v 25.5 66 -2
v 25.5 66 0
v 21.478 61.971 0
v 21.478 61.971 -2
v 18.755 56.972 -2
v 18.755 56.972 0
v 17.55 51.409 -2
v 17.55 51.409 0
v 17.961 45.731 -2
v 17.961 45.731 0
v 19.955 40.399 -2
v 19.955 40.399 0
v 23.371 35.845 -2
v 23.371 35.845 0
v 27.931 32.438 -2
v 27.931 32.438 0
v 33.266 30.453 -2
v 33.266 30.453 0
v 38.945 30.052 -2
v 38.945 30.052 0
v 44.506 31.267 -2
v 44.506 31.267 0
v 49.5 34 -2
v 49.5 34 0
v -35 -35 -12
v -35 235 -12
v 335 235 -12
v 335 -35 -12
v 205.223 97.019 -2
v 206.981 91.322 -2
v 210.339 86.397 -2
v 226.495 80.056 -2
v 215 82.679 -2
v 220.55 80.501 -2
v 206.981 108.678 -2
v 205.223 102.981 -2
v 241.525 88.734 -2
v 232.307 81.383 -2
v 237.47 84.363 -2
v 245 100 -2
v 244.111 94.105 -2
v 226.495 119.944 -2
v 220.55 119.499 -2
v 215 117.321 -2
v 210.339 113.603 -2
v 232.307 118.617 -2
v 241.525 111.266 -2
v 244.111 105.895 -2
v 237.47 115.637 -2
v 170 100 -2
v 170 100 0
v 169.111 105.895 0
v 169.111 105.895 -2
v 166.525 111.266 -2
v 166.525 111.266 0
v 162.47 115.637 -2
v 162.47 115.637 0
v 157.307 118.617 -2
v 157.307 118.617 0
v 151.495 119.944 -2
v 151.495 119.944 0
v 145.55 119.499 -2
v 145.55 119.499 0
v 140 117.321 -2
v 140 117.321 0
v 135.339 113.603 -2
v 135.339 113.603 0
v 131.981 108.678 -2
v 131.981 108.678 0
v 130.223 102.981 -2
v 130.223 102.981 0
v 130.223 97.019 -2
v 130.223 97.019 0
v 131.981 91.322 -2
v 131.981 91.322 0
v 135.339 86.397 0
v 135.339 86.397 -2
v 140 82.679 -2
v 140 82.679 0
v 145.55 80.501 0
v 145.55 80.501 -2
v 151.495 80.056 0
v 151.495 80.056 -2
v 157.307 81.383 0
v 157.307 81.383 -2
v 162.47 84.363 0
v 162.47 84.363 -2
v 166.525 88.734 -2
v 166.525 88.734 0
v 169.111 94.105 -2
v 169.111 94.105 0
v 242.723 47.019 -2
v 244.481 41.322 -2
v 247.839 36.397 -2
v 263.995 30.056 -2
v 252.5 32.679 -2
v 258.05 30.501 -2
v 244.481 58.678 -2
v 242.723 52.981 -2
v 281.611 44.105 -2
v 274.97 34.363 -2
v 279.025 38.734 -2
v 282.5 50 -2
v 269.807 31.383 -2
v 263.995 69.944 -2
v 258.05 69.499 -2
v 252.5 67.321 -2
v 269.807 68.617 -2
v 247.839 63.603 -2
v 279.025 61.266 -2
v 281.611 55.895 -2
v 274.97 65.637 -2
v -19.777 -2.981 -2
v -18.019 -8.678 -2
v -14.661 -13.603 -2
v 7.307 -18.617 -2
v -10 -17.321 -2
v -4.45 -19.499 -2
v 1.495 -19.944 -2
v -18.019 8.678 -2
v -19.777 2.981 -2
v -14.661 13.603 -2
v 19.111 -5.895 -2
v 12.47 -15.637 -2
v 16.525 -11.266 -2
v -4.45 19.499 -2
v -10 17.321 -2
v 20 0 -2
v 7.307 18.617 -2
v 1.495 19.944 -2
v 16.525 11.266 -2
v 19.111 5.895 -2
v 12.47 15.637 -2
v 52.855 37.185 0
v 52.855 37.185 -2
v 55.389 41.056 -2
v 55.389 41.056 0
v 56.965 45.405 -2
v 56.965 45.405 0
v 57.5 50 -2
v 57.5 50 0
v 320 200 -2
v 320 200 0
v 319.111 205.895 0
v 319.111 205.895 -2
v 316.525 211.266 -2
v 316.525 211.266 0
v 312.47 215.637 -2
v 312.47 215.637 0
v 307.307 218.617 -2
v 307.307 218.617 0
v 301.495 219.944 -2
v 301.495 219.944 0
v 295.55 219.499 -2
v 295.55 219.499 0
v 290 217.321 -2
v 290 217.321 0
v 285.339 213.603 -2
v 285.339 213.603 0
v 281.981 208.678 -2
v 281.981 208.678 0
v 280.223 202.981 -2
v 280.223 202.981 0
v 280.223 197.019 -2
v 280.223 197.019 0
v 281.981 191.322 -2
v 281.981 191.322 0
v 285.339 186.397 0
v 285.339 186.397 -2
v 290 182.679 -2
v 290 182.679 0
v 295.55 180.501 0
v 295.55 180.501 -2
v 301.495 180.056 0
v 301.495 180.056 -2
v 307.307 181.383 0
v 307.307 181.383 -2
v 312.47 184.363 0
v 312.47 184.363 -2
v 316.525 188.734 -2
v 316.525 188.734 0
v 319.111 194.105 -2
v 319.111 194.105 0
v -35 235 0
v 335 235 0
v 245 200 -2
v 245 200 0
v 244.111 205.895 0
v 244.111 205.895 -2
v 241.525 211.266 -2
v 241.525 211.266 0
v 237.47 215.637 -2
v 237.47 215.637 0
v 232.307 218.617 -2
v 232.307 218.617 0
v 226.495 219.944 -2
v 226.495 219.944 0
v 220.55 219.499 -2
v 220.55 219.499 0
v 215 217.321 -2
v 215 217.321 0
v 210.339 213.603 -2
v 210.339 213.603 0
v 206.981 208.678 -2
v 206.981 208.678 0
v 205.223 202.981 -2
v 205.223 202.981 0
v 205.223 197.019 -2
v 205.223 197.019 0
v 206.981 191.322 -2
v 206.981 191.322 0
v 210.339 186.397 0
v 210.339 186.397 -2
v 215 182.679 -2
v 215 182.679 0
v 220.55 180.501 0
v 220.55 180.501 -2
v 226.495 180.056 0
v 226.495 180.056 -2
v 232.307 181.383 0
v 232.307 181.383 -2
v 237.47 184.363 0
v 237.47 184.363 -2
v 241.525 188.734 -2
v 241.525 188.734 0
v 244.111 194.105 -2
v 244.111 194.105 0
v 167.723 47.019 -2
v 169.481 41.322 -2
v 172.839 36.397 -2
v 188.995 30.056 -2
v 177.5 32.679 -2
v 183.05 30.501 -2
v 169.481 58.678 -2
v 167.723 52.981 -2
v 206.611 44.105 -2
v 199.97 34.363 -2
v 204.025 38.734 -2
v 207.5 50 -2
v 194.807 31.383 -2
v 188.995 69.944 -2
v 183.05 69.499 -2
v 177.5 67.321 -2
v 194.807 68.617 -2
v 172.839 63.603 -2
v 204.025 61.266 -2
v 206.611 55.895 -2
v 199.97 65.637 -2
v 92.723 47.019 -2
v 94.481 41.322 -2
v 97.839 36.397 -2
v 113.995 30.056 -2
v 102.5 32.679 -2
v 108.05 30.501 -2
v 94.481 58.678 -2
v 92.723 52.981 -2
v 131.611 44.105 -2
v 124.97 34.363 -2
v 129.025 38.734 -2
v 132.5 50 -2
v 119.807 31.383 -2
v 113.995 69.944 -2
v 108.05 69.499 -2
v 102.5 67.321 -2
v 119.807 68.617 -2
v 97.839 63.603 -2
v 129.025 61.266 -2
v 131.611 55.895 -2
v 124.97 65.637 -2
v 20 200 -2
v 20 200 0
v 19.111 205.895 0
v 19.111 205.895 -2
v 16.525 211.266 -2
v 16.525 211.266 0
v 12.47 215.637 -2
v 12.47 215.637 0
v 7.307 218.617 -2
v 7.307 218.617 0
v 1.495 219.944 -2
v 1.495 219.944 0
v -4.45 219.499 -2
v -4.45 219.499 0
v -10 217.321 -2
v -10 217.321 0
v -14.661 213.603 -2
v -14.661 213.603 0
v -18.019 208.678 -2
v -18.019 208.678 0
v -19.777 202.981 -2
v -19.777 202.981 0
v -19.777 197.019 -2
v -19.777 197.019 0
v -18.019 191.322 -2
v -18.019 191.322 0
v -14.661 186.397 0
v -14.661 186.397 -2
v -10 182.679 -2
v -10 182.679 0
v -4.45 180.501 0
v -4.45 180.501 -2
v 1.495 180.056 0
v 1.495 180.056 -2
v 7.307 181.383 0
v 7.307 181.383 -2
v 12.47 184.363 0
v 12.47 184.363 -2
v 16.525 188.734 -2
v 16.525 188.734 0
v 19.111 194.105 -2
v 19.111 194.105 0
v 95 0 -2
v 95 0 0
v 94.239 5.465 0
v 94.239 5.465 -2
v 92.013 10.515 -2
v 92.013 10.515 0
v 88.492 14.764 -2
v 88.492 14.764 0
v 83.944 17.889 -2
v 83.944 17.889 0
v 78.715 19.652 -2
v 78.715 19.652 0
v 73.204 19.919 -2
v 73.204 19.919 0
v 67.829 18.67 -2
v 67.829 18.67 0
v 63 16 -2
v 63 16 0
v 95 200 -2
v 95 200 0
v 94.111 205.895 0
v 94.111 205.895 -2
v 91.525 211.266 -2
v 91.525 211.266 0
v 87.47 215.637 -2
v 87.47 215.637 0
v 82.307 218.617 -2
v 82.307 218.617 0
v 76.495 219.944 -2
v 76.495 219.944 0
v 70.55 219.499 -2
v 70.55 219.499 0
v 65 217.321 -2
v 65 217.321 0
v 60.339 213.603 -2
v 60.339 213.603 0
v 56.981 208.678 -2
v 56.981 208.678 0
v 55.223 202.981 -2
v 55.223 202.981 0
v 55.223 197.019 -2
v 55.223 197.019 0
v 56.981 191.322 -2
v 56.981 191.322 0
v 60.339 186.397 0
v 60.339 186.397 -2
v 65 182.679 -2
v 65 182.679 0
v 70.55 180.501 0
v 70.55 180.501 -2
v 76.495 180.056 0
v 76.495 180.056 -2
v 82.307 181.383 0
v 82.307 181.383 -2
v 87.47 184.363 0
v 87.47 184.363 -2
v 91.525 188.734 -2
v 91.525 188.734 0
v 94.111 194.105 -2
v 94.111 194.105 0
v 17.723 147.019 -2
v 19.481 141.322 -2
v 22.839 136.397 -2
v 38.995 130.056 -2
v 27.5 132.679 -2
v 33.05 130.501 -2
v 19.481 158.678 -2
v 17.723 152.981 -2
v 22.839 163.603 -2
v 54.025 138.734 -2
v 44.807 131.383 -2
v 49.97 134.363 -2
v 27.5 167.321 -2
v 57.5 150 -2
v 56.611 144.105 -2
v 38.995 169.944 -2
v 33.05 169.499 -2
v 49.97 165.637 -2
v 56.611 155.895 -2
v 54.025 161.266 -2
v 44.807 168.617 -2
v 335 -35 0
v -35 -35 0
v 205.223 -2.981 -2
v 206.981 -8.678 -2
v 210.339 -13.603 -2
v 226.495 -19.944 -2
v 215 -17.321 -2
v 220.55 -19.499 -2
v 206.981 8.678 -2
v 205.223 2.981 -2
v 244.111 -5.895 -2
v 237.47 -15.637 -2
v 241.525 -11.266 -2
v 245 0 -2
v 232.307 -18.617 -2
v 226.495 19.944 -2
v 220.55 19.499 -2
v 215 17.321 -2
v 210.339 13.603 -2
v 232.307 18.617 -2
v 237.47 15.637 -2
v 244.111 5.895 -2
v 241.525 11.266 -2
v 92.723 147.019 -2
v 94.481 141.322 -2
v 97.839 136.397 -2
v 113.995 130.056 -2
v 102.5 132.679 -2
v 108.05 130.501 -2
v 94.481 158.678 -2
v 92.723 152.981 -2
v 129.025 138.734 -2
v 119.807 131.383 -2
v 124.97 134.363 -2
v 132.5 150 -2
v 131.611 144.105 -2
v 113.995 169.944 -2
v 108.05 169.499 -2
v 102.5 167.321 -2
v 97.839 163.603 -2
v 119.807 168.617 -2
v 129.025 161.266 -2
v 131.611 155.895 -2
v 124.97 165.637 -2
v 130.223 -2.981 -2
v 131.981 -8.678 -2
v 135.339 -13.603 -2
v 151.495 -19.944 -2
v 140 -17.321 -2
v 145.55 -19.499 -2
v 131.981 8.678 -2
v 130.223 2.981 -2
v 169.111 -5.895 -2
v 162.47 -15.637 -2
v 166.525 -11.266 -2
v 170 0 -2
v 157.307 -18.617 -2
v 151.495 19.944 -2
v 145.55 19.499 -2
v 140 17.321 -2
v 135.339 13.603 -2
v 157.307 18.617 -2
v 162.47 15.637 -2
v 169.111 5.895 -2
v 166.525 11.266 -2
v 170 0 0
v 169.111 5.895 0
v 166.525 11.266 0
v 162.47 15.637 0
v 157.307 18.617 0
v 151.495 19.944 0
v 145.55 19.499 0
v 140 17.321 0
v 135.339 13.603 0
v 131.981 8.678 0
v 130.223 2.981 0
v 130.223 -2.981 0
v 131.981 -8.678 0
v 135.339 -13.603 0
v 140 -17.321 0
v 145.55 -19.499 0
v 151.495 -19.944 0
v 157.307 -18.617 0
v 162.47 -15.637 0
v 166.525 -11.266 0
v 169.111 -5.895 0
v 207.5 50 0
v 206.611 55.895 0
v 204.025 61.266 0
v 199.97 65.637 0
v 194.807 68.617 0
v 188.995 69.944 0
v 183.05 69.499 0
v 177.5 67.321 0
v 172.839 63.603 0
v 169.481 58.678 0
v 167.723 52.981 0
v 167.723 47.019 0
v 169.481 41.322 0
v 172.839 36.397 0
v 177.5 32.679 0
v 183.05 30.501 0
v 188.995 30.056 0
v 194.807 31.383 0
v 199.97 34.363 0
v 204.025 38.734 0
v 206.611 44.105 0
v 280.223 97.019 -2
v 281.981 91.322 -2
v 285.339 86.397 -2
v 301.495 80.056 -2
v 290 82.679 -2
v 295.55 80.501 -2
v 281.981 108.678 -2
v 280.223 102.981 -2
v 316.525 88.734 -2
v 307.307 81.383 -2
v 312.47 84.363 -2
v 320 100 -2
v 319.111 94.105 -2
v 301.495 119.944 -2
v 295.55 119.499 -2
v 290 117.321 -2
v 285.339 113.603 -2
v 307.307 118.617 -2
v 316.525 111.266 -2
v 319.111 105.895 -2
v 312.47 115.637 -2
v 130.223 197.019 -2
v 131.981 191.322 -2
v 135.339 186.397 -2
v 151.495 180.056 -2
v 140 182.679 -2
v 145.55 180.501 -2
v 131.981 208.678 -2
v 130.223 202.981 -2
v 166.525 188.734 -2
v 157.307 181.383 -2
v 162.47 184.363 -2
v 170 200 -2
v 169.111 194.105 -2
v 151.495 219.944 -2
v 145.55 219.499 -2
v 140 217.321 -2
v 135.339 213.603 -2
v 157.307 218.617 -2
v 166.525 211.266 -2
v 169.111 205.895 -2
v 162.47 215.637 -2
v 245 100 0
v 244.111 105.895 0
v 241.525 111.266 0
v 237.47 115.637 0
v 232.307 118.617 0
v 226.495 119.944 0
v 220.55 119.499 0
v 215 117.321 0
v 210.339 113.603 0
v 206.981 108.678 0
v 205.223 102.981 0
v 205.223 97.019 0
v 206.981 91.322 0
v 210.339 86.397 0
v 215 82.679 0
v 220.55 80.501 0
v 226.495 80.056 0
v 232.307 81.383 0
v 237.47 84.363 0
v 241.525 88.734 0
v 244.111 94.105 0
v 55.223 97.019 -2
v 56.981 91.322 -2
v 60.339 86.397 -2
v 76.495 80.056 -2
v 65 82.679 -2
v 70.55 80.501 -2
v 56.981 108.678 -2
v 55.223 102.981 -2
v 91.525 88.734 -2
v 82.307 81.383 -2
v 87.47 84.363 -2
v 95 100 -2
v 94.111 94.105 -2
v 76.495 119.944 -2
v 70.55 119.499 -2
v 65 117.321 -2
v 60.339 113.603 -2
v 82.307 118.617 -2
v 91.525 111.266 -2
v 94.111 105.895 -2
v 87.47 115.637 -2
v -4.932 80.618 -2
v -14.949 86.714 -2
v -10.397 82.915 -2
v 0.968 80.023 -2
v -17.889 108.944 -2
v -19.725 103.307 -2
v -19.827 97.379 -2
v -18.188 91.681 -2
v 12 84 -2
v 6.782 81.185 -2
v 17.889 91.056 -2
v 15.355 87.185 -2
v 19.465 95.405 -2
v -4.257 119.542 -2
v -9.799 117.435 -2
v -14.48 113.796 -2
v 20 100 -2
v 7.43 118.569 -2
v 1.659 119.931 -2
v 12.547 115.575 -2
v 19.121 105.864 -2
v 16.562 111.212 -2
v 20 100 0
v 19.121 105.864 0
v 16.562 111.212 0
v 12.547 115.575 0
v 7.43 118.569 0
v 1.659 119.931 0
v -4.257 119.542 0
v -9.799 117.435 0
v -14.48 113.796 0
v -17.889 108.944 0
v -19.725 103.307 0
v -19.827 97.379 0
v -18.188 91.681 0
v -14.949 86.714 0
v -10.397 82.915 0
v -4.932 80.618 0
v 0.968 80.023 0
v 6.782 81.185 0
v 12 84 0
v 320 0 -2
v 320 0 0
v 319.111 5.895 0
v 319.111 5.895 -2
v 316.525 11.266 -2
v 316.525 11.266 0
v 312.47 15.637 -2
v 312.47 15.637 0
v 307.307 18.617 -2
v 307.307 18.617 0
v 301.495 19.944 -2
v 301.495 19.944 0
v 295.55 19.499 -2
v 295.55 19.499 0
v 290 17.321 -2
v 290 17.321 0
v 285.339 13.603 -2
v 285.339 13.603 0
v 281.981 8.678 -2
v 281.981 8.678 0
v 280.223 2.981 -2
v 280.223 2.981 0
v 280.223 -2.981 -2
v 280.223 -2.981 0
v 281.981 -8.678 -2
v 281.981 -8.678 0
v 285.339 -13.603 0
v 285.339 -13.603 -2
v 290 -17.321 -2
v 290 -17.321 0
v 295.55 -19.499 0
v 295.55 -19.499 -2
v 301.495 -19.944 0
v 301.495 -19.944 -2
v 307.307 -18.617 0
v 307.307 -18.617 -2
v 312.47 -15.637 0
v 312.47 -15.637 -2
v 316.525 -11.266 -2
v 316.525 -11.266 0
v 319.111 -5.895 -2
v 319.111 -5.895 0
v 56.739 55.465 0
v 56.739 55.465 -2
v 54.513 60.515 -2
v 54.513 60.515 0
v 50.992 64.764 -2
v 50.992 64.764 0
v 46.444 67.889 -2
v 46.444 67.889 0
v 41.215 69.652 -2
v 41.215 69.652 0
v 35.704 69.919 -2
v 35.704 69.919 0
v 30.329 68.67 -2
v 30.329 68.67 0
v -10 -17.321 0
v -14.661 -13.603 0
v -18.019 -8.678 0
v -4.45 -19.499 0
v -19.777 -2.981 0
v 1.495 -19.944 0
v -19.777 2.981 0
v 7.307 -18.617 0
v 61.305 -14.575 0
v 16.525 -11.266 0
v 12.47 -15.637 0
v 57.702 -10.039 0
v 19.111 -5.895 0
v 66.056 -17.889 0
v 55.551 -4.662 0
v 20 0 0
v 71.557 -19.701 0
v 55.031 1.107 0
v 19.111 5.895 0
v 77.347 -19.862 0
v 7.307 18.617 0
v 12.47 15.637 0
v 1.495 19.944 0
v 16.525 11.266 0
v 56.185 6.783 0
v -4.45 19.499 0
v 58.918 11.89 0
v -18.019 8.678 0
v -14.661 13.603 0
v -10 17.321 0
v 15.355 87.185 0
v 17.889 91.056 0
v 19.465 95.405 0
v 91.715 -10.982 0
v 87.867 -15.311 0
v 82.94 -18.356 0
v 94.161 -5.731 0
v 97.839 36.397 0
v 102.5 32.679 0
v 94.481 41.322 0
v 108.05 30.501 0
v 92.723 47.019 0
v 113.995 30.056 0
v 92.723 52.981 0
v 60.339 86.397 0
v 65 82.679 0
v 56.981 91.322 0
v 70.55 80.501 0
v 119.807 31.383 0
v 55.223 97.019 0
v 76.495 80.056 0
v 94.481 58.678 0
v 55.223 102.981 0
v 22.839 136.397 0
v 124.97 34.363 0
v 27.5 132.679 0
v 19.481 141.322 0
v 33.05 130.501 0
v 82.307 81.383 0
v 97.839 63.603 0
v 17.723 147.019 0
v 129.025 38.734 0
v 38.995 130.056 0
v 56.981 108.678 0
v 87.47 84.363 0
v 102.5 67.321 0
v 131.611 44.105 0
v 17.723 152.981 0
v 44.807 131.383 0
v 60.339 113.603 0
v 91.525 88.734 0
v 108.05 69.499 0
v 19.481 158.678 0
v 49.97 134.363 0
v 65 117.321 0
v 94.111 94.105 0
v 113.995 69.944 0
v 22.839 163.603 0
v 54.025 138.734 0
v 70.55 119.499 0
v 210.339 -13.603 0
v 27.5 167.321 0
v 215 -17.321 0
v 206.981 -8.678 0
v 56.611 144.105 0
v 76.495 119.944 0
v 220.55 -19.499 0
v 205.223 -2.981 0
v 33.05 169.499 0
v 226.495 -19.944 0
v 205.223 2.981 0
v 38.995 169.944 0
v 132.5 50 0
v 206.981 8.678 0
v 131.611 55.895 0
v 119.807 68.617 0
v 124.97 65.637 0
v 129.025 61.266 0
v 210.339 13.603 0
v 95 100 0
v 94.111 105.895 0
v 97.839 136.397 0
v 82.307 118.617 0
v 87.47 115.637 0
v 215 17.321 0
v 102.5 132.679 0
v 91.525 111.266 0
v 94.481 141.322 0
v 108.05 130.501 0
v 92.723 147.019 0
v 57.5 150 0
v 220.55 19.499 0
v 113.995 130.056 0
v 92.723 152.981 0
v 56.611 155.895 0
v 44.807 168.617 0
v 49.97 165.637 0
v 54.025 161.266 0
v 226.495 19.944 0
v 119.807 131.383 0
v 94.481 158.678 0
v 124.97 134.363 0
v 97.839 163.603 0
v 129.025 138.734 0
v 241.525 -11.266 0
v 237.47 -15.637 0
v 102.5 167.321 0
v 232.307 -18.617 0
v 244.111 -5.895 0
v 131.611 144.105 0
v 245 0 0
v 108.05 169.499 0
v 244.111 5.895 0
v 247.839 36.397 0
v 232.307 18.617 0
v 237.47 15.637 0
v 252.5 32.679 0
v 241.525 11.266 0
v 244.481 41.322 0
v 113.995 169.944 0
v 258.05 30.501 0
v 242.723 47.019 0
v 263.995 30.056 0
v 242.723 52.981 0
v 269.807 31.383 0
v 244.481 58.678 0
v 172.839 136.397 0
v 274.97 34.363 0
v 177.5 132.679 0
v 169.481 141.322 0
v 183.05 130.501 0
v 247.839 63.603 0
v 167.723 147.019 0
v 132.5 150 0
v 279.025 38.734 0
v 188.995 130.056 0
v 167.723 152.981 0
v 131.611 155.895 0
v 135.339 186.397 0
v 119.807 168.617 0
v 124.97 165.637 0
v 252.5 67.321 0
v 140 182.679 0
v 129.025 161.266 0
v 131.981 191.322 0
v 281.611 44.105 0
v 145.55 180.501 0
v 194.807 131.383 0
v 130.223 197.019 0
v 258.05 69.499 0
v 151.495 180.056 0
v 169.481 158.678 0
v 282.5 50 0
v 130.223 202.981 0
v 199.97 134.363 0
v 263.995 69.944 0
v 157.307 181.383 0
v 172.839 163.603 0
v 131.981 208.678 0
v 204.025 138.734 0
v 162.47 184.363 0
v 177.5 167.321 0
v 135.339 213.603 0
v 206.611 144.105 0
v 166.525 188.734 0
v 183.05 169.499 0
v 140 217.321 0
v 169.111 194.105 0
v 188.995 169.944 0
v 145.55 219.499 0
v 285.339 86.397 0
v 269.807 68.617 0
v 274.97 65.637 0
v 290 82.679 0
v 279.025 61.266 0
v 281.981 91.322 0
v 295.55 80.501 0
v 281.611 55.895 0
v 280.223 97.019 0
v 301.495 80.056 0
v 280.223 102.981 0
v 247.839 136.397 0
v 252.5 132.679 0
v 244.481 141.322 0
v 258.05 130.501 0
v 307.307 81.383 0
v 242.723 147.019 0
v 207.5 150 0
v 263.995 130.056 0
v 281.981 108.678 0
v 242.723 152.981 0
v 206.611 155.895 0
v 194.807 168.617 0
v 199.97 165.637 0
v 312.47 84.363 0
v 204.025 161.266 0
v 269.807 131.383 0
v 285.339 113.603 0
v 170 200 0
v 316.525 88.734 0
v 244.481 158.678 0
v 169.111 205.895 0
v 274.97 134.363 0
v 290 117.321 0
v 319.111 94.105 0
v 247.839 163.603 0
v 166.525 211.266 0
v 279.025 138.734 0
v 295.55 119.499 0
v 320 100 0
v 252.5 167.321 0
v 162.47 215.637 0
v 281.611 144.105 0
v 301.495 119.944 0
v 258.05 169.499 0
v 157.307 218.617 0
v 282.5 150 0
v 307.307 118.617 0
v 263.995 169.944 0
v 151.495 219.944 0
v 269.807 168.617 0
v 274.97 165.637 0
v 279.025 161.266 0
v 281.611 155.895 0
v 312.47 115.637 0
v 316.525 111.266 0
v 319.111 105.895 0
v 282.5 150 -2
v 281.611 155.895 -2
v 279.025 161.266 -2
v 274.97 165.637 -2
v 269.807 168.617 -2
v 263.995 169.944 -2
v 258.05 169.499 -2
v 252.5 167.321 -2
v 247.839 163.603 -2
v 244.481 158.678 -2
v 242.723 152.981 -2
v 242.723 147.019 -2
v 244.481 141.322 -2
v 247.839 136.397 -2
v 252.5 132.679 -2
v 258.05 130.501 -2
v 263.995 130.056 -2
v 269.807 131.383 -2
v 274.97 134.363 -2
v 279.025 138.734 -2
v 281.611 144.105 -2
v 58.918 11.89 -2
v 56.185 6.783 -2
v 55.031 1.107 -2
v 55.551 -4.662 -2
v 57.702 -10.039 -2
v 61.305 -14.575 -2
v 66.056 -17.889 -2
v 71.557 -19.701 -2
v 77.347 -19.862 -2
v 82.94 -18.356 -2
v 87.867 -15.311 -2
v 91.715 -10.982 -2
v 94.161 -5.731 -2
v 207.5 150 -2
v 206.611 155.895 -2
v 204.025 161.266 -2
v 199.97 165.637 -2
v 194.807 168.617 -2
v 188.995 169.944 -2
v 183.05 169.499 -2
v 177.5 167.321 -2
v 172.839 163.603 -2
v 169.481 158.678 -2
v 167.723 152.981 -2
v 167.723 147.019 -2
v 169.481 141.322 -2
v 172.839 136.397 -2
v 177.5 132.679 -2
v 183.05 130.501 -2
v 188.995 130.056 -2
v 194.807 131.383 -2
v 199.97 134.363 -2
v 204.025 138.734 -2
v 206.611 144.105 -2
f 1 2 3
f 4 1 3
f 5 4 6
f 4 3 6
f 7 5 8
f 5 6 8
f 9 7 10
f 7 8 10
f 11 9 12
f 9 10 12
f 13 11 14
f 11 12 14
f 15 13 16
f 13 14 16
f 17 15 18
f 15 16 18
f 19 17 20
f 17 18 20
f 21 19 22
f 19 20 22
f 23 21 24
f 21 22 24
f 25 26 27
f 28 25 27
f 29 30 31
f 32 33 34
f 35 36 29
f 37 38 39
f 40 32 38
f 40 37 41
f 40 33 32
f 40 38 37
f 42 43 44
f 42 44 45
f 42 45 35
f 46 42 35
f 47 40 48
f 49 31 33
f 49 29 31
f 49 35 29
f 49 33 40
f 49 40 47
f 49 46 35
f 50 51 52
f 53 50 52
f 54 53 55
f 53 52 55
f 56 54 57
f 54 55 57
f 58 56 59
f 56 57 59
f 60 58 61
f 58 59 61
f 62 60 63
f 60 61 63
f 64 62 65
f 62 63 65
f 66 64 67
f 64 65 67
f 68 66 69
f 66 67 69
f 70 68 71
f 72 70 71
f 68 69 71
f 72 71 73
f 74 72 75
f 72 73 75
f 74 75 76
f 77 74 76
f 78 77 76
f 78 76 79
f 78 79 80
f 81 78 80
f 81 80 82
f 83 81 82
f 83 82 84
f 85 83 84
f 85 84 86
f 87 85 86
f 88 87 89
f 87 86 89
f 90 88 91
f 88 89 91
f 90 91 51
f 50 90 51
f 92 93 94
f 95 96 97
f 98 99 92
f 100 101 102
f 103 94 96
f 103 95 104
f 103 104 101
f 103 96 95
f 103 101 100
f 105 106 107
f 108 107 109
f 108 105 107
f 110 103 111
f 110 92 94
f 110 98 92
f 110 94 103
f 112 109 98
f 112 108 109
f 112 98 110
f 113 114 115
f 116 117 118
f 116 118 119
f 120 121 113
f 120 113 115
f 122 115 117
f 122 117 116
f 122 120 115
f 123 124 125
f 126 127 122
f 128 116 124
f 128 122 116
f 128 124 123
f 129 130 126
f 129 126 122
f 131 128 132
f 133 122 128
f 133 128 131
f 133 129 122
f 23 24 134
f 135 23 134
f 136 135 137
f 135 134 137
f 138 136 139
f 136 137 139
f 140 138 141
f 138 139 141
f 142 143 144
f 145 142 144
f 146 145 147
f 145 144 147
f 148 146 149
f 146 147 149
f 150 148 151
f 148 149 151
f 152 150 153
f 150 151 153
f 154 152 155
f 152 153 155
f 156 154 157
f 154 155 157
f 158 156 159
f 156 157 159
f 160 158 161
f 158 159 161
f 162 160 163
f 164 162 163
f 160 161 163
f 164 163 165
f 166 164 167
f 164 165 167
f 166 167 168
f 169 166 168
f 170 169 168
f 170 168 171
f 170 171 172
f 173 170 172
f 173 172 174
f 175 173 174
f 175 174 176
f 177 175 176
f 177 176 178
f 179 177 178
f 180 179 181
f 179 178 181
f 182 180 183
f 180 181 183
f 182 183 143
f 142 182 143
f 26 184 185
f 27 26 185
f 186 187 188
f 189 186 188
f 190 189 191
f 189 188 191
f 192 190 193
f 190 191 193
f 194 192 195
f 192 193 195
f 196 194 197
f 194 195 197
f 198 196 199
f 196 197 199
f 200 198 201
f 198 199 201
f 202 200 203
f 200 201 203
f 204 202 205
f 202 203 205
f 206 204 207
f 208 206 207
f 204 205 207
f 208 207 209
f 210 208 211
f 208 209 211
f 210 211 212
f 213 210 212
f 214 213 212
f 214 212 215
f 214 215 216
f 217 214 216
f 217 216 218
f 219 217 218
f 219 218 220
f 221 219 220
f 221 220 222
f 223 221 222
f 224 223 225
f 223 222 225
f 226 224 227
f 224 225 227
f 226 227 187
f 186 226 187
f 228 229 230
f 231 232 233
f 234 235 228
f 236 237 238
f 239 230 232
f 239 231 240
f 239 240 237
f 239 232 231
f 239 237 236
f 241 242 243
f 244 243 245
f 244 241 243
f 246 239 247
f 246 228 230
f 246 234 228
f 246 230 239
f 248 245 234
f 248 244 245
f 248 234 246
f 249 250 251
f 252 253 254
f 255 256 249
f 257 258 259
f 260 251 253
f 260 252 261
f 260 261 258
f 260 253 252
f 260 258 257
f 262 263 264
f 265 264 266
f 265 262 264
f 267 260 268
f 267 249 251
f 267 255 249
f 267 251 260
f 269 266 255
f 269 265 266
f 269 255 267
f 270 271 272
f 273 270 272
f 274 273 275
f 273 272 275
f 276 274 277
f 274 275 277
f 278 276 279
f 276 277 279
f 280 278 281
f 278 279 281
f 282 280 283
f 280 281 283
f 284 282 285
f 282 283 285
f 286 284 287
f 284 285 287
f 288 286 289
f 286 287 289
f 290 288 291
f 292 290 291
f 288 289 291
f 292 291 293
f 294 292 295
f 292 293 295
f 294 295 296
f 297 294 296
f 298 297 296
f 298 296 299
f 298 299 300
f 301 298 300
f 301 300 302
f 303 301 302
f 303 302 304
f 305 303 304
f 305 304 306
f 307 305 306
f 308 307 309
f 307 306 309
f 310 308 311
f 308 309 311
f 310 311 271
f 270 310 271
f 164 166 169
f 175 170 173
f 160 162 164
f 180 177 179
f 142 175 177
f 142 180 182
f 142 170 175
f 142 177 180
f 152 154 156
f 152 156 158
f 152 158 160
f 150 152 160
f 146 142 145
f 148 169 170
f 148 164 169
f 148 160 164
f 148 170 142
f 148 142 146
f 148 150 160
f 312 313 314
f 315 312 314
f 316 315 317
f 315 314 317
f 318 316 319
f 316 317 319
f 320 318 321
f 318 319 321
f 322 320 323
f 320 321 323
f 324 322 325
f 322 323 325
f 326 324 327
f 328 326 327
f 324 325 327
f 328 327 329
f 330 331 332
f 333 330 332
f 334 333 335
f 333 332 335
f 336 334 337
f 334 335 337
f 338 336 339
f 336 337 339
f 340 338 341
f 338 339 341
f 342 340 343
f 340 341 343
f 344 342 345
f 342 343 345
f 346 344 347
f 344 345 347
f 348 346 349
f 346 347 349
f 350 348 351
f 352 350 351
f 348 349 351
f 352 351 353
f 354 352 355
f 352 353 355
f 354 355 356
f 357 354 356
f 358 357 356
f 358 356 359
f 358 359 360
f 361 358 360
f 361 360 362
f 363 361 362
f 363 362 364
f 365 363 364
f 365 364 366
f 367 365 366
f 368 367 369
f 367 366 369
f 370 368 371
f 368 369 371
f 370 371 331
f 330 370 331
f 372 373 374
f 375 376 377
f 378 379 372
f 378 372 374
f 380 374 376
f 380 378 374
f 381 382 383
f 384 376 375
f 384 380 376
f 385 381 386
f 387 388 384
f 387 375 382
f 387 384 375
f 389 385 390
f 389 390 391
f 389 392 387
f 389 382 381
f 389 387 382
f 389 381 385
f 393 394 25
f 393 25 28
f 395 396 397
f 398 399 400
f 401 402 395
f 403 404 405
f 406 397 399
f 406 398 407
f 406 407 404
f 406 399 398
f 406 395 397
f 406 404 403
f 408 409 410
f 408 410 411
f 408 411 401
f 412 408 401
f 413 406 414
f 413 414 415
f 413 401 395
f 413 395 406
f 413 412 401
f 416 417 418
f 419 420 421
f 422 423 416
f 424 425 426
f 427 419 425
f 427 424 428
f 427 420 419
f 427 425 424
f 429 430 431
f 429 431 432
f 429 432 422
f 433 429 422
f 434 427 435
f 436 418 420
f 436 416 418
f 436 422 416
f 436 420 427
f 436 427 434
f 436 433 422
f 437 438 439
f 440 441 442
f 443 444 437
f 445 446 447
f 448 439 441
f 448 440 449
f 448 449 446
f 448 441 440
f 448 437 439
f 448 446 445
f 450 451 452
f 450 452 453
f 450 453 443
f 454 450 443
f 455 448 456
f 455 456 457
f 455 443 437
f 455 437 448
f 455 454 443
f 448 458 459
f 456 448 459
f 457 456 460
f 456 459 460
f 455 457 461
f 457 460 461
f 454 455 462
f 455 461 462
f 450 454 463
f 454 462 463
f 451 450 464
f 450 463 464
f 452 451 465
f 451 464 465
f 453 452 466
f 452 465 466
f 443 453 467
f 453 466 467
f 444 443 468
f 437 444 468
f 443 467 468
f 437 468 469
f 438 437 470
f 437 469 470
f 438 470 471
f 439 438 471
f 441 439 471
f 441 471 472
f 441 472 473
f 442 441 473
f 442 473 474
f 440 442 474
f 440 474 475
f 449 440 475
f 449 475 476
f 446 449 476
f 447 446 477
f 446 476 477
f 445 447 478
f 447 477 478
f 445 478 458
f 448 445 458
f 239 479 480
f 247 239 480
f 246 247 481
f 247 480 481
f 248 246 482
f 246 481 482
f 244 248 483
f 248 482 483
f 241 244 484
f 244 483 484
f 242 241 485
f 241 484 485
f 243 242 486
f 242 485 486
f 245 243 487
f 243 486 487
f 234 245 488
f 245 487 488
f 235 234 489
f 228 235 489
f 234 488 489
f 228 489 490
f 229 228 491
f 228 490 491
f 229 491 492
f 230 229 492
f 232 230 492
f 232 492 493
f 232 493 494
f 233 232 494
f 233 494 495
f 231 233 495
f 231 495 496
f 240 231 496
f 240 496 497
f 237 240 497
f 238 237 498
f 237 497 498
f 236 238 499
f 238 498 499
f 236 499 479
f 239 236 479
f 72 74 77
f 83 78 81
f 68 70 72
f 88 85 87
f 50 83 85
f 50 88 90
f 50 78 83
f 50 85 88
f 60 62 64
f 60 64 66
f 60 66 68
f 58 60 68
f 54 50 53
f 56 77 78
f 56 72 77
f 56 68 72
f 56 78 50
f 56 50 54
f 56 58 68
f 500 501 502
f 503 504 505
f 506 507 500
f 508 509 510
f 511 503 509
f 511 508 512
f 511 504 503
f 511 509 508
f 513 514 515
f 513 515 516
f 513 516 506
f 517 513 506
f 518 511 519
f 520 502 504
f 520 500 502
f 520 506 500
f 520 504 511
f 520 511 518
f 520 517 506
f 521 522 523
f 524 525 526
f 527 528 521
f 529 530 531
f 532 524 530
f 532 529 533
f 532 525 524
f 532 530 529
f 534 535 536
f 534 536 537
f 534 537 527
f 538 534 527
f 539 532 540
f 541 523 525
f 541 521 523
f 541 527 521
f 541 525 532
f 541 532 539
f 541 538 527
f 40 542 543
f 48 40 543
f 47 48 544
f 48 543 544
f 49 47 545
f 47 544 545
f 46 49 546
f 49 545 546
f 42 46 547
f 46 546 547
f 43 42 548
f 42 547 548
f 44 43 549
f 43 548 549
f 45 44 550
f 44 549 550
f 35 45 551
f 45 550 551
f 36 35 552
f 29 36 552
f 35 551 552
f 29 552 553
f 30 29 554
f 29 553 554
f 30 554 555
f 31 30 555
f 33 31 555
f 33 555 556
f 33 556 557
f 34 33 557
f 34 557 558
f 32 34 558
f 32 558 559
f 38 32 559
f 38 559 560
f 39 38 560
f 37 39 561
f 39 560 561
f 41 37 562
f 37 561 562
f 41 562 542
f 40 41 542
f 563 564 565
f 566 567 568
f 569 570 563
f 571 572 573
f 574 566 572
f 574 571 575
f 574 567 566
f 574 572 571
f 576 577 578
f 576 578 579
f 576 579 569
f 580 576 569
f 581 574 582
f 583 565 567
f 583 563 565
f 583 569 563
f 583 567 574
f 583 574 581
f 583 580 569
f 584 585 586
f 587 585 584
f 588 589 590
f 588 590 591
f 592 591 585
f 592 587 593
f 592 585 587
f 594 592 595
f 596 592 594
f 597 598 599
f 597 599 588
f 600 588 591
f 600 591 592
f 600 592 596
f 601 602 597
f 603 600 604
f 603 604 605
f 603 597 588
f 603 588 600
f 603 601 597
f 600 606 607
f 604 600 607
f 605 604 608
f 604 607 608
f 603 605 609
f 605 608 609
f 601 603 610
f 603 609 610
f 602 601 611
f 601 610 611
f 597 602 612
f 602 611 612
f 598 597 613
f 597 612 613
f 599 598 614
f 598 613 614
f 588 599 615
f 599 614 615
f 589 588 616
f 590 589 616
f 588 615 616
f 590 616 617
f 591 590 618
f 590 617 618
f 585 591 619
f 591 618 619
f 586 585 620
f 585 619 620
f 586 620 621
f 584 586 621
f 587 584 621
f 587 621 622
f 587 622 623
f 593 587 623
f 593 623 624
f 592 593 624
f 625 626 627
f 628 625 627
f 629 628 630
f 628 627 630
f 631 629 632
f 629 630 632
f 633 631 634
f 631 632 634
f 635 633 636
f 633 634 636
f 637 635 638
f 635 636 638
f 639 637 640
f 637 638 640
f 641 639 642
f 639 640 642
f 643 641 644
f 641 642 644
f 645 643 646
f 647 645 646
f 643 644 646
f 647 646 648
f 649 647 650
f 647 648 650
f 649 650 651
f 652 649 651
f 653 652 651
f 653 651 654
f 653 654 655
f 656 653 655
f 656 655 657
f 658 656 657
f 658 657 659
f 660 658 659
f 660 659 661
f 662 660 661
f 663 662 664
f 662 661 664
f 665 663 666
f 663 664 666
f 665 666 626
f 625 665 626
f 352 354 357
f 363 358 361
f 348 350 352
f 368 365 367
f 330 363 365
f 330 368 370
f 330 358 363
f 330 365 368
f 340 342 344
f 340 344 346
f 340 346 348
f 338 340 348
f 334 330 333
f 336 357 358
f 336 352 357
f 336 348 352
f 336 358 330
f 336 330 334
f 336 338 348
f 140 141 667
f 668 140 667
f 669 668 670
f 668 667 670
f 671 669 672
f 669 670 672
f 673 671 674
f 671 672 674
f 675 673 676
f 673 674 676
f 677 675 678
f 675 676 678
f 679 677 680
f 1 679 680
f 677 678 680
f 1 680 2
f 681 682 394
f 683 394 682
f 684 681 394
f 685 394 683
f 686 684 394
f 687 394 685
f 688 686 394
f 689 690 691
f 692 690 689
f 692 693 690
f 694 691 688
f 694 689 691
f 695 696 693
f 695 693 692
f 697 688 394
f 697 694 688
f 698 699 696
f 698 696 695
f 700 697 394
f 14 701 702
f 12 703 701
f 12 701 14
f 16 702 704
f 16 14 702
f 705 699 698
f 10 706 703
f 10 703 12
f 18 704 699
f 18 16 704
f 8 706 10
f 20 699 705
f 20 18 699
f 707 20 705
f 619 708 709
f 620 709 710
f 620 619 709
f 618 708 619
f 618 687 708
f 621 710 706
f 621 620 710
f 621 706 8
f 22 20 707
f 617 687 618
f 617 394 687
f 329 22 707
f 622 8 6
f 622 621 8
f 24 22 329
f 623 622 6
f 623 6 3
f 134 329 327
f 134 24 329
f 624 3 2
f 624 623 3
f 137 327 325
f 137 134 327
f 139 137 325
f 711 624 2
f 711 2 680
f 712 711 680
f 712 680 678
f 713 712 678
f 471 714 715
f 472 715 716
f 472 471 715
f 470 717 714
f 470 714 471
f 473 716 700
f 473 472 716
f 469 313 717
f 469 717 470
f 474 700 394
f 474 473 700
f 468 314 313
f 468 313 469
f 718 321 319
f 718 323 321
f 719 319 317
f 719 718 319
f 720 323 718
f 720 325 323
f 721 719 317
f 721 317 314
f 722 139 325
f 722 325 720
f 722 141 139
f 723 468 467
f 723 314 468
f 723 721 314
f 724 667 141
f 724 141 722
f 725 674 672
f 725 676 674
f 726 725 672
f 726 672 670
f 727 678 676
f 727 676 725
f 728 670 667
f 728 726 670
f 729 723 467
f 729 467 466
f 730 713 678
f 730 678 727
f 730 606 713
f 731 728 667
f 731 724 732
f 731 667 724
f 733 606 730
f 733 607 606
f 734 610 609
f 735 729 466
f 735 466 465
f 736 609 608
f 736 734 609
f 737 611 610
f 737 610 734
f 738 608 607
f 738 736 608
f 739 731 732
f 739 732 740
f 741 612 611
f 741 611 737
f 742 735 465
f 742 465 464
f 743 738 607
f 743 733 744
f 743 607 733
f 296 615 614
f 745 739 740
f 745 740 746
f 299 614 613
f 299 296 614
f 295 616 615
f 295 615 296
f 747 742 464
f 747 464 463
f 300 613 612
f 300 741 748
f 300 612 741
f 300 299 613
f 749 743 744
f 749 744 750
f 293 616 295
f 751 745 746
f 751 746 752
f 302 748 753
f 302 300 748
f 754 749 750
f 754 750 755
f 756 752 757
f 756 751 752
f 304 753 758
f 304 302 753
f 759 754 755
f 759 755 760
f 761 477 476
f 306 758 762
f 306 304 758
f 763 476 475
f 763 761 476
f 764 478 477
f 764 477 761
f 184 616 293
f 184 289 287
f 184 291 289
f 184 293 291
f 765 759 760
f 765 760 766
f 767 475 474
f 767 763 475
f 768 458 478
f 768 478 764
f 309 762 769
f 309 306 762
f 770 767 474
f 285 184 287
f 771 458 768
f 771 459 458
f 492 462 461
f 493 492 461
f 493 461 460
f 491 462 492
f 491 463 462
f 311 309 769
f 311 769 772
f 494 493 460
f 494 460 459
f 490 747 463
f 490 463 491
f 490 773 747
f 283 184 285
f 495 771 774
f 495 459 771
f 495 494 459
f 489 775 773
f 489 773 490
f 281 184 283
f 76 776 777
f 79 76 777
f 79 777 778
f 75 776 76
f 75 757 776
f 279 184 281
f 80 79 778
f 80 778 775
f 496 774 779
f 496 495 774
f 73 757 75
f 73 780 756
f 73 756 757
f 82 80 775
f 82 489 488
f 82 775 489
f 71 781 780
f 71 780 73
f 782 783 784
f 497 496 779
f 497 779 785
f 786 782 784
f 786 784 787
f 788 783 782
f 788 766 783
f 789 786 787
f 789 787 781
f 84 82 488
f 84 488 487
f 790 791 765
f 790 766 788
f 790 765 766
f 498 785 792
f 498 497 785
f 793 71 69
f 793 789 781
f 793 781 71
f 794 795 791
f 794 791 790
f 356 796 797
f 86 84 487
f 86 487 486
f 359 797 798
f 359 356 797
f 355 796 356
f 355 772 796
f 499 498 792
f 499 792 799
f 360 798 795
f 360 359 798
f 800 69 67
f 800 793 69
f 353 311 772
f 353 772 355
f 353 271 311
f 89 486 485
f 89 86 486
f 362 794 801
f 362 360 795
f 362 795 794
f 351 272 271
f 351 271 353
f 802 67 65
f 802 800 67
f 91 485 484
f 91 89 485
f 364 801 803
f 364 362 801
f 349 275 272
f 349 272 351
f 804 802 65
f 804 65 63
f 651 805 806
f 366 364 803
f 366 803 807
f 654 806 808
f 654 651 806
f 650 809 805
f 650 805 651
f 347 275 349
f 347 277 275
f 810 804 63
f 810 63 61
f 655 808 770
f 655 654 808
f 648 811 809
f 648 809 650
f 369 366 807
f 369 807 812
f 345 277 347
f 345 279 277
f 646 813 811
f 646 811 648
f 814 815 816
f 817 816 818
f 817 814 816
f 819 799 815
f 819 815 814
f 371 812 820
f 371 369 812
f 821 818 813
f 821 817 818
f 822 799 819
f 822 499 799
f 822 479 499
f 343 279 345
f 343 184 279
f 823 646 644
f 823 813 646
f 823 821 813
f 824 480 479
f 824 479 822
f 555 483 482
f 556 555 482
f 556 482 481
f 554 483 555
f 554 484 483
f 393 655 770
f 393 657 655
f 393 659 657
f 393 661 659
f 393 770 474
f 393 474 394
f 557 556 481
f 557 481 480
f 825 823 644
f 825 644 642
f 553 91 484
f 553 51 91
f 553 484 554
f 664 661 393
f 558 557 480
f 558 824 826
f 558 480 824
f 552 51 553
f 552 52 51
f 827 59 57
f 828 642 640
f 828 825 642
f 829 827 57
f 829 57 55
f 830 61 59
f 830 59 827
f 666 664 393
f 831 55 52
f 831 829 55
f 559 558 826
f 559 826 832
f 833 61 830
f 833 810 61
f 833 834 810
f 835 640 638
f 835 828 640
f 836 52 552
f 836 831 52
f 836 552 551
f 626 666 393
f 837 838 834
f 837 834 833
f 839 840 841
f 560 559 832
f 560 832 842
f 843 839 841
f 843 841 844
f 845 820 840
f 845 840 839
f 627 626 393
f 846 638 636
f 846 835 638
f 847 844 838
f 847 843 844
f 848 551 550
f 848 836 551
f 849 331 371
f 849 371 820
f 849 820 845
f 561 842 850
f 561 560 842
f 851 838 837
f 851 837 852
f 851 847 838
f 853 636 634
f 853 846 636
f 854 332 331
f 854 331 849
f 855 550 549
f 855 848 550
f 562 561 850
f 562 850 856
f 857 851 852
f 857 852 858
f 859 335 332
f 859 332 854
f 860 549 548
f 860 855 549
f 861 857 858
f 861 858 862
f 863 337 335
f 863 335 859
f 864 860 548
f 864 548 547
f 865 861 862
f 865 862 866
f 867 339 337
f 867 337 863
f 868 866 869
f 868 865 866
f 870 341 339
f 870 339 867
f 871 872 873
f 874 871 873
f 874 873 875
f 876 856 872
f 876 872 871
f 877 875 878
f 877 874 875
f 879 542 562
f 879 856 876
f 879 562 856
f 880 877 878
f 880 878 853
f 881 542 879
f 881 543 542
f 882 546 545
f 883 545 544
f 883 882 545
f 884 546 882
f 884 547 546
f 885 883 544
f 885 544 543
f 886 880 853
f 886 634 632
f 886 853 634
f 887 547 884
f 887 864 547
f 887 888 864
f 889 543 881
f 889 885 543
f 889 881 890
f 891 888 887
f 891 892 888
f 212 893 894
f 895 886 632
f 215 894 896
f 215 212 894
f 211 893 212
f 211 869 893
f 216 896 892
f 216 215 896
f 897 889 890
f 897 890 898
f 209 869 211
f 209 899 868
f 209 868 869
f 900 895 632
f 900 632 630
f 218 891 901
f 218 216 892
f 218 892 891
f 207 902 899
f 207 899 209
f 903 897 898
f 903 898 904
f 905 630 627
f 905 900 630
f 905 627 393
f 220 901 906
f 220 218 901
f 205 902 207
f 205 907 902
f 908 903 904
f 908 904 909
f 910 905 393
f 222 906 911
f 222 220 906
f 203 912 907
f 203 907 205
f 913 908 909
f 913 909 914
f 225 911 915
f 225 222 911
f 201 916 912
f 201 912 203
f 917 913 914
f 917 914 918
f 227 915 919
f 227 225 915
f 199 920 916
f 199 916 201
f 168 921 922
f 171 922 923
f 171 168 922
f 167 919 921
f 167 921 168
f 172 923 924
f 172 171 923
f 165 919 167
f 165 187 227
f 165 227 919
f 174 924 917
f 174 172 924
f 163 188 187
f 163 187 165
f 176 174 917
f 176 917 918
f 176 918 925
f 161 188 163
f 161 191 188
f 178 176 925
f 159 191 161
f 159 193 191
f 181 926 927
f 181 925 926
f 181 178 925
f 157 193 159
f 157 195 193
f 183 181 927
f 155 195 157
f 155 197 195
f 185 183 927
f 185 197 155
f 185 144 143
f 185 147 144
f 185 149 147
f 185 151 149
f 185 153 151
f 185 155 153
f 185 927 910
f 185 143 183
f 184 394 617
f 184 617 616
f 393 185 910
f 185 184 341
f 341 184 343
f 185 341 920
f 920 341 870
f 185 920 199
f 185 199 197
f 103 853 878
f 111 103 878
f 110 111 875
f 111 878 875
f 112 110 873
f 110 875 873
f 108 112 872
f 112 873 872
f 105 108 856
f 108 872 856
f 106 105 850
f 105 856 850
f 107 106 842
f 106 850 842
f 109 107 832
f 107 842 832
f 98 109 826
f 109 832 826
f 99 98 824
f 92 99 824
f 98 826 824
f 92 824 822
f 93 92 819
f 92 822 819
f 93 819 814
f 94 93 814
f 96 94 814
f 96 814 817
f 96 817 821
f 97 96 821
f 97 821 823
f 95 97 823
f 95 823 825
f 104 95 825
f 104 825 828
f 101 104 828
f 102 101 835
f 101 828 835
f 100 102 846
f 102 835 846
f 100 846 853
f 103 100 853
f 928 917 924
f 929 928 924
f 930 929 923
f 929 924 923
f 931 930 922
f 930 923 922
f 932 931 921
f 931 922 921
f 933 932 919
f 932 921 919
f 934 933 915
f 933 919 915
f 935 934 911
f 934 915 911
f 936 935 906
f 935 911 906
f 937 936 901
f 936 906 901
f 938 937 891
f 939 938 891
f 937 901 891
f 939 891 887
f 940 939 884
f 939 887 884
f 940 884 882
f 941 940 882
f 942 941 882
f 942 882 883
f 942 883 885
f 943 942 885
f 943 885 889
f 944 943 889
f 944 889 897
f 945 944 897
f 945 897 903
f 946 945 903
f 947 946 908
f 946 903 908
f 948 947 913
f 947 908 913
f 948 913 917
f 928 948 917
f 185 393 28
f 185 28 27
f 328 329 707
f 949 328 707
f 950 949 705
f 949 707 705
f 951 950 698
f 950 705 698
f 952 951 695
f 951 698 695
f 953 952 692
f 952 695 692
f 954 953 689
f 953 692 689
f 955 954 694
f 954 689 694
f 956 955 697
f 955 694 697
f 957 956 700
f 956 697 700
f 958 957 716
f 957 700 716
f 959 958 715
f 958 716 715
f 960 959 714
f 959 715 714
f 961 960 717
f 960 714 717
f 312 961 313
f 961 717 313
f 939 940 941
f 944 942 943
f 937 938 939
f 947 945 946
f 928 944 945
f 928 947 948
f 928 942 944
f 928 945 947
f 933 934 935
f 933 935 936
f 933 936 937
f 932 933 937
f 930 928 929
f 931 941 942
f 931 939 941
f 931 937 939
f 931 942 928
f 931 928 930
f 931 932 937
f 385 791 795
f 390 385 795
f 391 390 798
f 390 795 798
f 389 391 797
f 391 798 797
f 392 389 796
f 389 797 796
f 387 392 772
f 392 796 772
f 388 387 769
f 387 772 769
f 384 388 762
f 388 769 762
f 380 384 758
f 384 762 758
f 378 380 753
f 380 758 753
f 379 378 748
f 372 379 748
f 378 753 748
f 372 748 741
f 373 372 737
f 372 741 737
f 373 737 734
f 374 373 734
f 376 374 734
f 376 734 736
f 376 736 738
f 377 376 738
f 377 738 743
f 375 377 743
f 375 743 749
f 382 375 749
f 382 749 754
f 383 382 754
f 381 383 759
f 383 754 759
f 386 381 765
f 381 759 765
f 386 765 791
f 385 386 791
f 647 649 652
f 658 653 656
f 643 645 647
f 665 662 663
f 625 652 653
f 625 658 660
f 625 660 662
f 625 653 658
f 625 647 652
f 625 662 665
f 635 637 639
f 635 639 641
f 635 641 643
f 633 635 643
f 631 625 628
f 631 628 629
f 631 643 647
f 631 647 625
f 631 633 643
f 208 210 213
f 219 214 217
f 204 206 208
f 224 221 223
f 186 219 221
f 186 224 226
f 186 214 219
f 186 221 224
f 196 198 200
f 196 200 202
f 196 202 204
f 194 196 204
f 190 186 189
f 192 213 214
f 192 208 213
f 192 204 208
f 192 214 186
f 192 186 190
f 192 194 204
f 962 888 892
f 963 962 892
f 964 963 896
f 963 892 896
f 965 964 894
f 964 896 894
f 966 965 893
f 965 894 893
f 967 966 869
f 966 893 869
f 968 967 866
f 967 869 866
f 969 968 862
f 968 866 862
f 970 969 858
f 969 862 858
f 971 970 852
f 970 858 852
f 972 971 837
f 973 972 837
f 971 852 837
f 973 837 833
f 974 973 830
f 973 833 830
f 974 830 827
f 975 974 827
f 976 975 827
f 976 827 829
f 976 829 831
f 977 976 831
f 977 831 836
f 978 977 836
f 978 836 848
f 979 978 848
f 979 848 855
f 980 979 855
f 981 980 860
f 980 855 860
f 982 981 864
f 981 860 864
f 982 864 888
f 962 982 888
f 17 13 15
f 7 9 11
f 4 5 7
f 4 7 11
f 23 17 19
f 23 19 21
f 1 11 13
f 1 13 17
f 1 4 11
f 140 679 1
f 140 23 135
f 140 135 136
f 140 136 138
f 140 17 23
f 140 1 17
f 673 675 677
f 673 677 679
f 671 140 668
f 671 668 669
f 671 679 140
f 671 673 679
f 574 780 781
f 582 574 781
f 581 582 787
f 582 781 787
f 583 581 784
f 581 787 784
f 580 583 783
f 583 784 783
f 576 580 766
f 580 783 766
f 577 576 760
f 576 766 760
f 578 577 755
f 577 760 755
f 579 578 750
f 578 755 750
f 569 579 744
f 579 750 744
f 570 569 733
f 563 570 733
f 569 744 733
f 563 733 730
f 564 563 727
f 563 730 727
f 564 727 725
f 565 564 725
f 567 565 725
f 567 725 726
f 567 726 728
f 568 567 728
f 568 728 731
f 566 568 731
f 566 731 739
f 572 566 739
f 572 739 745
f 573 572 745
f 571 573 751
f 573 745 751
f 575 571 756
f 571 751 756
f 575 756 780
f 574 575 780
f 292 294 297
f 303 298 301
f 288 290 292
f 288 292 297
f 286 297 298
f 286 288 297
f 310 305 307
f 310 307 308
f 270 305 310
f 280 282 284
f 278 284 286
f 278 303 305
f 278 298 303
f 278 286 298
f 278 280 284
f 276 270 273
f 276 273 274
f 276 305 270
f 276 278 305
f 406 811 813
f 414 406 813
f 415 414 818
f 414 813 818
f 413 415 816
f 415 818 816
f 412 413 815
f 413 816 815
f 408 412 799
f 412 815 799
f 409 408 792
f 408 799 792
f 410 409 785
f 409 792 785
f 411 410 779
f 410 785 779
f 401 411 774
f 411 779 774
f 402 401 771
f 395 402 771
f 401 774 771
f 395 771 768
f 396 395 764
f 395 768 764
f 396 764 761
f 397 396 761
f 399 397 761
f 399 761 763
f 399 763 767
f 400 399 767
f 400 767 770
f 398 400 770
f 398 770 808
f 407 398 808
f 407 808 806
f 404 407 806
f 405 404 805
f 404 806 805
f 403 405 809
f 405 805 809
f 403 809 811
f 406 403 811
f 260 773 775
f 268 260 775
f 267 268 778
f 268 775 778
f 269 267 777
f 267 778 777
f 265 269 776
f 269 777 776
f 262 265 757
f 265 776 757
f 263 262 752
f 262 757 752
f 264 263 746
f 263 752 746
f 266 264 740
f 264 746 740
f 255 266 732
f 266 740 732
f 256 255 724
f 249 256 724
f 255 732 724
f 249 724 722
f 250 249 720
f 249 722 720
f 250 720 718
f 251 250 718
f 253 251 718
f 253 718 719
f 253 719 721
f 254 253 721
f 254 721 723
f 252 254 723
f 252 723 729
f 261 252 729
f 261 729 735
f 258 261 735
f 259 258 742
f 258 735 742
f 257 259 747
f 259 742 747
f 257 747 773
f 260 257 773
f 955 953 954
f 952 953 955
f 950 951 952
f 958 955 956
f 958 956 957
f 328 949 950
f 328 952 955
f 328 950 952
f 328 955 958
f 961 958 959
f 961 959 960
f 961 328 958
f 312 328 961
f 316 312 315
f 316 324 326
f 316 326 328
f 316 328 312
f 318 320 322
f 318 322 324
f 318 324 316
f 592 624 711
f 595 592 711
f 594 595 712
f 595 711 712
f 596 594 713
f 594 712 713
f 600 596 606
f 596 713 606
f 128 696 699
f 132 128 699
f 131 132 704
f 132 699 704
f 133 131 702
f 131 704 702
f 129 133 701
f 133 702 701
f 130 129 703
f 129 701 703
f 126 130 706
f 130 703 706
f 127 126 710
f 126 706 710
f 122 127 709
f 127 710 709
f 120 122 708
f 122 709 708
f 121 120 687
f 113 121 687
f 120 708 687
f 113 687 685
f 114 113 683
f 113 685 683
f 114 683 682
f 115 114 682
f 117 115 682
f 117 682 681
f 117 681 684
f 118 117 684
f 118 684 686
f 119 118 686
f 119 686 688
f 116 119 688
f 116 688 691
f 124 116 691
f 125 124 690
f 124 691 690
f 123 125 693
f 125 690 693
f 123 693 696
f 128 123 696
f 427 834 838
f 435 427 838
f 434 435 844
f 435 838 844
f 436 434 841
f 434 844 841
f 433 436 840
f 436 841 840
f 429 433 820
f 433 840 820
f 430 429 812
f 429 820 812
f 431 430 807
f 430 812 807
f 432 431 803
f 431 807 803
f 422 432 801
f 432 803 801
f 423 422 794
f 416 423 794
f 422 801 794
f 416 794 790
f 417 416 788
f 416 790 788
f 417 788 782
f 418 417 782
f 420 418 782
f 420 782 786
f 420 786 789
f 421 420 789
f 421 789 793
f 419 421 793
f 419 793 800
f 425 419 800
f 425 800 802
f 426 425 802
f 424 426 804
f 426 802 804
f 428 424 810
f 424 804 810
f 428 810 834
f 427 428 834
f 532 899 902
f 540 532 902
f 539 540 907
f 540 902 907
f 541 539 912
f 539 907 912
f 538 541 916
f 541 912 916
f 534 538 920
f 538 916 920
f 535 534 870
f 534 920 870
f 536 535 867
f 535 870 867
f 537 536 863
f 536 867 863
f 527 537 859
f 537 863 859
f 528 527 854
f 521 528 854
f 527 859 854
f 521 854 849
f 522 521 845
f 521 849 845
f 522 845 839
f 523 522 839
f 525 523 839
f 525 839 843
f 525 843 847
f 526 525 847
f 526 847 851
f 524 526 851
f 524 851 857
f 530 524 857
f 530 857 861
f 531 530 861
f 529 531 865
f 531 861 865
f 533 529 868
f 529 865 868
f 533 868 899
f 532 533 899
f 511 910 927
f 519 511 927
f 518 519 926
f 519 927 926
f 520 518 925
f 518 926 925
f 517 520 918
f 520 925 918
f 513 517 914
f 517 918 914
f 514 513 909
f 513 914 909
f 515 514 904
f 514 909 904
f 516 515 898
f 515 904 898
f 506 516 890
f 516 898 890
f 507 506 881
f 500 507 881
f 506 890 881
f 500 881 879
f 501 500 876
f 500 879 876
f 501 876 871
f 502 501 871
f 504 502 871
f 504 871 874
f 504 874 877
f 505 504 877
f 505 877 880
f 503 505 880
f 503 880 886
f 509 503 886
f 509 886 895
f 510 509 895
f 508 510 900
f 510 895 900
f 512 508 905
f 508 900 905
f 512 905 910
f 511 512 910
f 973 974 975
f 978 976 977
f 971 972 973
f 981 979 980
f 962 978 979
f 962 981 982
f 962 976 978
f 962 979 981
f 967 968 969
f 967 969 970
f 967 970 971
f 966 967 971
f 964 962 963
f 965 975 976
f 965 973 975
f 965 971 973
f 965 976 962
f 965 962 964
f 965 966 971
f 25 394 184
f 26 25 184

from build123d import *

# Parameters (mm, degrees)
F0_R     = 20
F1_DEPTH = 2
F2_W     = 370
F2_H     = 270
F3_DEPTH = 12


with BuildPart() as f1:
    # F0 (on Top) → F1 (new body)
    with BuildSketch(Plane.XY):
        with Locations((0, 200)):
            Circle(F0_R)
        with Locations((75, 200)):
            Circle(F0_R)
        with Locations((150, 200)):
            Circle(F0_R)
        with Locations((225, 200)):
            Circle(F0_R)
        with Locations((300, 200)):
            Circle(F0_R)
        with Locations((262.5, 150)):
            Circle(F0_R)
        with Locations((300, 100)):
            Circle(F0_R)
        with Locations((300, 0)):
            Circle(F0_R)
        with Locations((187.5, 150)):
            Circle(F0_R)
        with Locations((112.5, 150)):
            Circle(F0_R)
        with Locations((37.5, 150)):
            Circle(F0_R)
        with BuildLine():
            ThreePointArc((12, 84), (17.888544, 91.055728), (20, 100))
            ThreePointArc((20, 100), (-17.888544, 108.944272), (12, 84))
        make_face()
        with Locations((75, 100)):
            Circle(F0_R)
        with Locations((150, 100)):
            Circle(F0_R)
        with Locations((225, 100)):
            Circle(F0_R)
        with Locations((262.5, 50)):
            Circle(F0_R)
        with Locations((187.5, 50)):
            Circle(F0_R)
        with Locations((225, 0)):
            Circle(F0_R)
        with Locations((150, 0)):
            Circle(F0_R)
        with Locations((112.5, 50)):
            Circle(F0_R)
        with BuildLine():
            ThreePointArc((57.5, 50), (46.444272, 67.888544), (25.5, 66))
            Line((25.5, 66), (49.5, 34))
            ThreePointArc((49.5, 34), (55.388544, 41.055728), (57.5, 50))
        make_face()
        Circle(F0_R)
        with BuildLine():
            ThreePointArc((95, 0), (83.944272, 17.888544), (63, 16))
            ThreePointArc((63, 16), (66.055728, -17.888544), (95, 0))
        make_face()
        with BuildLine():
            Line((49.5, 34), (25.5, 66))
            ThreePointArc((25.5, 66), (21.5, 38), (49.5, 34))
        make_face()
    extrude(amount=-F1_DEPTH)


with BuildPart() as f3:
    # F2 (on Top) → F3 (new body)
    with BuildSketch(Plane.XY):
        with Locations((150, 100)):
            Rectangle(F2_W, F2_H)
    extrude(amount=-F3_DEPTH)

    # F4: cut F1
    add(f1.part, mode=Mode.SUBTRACT)


solid = f3.part
